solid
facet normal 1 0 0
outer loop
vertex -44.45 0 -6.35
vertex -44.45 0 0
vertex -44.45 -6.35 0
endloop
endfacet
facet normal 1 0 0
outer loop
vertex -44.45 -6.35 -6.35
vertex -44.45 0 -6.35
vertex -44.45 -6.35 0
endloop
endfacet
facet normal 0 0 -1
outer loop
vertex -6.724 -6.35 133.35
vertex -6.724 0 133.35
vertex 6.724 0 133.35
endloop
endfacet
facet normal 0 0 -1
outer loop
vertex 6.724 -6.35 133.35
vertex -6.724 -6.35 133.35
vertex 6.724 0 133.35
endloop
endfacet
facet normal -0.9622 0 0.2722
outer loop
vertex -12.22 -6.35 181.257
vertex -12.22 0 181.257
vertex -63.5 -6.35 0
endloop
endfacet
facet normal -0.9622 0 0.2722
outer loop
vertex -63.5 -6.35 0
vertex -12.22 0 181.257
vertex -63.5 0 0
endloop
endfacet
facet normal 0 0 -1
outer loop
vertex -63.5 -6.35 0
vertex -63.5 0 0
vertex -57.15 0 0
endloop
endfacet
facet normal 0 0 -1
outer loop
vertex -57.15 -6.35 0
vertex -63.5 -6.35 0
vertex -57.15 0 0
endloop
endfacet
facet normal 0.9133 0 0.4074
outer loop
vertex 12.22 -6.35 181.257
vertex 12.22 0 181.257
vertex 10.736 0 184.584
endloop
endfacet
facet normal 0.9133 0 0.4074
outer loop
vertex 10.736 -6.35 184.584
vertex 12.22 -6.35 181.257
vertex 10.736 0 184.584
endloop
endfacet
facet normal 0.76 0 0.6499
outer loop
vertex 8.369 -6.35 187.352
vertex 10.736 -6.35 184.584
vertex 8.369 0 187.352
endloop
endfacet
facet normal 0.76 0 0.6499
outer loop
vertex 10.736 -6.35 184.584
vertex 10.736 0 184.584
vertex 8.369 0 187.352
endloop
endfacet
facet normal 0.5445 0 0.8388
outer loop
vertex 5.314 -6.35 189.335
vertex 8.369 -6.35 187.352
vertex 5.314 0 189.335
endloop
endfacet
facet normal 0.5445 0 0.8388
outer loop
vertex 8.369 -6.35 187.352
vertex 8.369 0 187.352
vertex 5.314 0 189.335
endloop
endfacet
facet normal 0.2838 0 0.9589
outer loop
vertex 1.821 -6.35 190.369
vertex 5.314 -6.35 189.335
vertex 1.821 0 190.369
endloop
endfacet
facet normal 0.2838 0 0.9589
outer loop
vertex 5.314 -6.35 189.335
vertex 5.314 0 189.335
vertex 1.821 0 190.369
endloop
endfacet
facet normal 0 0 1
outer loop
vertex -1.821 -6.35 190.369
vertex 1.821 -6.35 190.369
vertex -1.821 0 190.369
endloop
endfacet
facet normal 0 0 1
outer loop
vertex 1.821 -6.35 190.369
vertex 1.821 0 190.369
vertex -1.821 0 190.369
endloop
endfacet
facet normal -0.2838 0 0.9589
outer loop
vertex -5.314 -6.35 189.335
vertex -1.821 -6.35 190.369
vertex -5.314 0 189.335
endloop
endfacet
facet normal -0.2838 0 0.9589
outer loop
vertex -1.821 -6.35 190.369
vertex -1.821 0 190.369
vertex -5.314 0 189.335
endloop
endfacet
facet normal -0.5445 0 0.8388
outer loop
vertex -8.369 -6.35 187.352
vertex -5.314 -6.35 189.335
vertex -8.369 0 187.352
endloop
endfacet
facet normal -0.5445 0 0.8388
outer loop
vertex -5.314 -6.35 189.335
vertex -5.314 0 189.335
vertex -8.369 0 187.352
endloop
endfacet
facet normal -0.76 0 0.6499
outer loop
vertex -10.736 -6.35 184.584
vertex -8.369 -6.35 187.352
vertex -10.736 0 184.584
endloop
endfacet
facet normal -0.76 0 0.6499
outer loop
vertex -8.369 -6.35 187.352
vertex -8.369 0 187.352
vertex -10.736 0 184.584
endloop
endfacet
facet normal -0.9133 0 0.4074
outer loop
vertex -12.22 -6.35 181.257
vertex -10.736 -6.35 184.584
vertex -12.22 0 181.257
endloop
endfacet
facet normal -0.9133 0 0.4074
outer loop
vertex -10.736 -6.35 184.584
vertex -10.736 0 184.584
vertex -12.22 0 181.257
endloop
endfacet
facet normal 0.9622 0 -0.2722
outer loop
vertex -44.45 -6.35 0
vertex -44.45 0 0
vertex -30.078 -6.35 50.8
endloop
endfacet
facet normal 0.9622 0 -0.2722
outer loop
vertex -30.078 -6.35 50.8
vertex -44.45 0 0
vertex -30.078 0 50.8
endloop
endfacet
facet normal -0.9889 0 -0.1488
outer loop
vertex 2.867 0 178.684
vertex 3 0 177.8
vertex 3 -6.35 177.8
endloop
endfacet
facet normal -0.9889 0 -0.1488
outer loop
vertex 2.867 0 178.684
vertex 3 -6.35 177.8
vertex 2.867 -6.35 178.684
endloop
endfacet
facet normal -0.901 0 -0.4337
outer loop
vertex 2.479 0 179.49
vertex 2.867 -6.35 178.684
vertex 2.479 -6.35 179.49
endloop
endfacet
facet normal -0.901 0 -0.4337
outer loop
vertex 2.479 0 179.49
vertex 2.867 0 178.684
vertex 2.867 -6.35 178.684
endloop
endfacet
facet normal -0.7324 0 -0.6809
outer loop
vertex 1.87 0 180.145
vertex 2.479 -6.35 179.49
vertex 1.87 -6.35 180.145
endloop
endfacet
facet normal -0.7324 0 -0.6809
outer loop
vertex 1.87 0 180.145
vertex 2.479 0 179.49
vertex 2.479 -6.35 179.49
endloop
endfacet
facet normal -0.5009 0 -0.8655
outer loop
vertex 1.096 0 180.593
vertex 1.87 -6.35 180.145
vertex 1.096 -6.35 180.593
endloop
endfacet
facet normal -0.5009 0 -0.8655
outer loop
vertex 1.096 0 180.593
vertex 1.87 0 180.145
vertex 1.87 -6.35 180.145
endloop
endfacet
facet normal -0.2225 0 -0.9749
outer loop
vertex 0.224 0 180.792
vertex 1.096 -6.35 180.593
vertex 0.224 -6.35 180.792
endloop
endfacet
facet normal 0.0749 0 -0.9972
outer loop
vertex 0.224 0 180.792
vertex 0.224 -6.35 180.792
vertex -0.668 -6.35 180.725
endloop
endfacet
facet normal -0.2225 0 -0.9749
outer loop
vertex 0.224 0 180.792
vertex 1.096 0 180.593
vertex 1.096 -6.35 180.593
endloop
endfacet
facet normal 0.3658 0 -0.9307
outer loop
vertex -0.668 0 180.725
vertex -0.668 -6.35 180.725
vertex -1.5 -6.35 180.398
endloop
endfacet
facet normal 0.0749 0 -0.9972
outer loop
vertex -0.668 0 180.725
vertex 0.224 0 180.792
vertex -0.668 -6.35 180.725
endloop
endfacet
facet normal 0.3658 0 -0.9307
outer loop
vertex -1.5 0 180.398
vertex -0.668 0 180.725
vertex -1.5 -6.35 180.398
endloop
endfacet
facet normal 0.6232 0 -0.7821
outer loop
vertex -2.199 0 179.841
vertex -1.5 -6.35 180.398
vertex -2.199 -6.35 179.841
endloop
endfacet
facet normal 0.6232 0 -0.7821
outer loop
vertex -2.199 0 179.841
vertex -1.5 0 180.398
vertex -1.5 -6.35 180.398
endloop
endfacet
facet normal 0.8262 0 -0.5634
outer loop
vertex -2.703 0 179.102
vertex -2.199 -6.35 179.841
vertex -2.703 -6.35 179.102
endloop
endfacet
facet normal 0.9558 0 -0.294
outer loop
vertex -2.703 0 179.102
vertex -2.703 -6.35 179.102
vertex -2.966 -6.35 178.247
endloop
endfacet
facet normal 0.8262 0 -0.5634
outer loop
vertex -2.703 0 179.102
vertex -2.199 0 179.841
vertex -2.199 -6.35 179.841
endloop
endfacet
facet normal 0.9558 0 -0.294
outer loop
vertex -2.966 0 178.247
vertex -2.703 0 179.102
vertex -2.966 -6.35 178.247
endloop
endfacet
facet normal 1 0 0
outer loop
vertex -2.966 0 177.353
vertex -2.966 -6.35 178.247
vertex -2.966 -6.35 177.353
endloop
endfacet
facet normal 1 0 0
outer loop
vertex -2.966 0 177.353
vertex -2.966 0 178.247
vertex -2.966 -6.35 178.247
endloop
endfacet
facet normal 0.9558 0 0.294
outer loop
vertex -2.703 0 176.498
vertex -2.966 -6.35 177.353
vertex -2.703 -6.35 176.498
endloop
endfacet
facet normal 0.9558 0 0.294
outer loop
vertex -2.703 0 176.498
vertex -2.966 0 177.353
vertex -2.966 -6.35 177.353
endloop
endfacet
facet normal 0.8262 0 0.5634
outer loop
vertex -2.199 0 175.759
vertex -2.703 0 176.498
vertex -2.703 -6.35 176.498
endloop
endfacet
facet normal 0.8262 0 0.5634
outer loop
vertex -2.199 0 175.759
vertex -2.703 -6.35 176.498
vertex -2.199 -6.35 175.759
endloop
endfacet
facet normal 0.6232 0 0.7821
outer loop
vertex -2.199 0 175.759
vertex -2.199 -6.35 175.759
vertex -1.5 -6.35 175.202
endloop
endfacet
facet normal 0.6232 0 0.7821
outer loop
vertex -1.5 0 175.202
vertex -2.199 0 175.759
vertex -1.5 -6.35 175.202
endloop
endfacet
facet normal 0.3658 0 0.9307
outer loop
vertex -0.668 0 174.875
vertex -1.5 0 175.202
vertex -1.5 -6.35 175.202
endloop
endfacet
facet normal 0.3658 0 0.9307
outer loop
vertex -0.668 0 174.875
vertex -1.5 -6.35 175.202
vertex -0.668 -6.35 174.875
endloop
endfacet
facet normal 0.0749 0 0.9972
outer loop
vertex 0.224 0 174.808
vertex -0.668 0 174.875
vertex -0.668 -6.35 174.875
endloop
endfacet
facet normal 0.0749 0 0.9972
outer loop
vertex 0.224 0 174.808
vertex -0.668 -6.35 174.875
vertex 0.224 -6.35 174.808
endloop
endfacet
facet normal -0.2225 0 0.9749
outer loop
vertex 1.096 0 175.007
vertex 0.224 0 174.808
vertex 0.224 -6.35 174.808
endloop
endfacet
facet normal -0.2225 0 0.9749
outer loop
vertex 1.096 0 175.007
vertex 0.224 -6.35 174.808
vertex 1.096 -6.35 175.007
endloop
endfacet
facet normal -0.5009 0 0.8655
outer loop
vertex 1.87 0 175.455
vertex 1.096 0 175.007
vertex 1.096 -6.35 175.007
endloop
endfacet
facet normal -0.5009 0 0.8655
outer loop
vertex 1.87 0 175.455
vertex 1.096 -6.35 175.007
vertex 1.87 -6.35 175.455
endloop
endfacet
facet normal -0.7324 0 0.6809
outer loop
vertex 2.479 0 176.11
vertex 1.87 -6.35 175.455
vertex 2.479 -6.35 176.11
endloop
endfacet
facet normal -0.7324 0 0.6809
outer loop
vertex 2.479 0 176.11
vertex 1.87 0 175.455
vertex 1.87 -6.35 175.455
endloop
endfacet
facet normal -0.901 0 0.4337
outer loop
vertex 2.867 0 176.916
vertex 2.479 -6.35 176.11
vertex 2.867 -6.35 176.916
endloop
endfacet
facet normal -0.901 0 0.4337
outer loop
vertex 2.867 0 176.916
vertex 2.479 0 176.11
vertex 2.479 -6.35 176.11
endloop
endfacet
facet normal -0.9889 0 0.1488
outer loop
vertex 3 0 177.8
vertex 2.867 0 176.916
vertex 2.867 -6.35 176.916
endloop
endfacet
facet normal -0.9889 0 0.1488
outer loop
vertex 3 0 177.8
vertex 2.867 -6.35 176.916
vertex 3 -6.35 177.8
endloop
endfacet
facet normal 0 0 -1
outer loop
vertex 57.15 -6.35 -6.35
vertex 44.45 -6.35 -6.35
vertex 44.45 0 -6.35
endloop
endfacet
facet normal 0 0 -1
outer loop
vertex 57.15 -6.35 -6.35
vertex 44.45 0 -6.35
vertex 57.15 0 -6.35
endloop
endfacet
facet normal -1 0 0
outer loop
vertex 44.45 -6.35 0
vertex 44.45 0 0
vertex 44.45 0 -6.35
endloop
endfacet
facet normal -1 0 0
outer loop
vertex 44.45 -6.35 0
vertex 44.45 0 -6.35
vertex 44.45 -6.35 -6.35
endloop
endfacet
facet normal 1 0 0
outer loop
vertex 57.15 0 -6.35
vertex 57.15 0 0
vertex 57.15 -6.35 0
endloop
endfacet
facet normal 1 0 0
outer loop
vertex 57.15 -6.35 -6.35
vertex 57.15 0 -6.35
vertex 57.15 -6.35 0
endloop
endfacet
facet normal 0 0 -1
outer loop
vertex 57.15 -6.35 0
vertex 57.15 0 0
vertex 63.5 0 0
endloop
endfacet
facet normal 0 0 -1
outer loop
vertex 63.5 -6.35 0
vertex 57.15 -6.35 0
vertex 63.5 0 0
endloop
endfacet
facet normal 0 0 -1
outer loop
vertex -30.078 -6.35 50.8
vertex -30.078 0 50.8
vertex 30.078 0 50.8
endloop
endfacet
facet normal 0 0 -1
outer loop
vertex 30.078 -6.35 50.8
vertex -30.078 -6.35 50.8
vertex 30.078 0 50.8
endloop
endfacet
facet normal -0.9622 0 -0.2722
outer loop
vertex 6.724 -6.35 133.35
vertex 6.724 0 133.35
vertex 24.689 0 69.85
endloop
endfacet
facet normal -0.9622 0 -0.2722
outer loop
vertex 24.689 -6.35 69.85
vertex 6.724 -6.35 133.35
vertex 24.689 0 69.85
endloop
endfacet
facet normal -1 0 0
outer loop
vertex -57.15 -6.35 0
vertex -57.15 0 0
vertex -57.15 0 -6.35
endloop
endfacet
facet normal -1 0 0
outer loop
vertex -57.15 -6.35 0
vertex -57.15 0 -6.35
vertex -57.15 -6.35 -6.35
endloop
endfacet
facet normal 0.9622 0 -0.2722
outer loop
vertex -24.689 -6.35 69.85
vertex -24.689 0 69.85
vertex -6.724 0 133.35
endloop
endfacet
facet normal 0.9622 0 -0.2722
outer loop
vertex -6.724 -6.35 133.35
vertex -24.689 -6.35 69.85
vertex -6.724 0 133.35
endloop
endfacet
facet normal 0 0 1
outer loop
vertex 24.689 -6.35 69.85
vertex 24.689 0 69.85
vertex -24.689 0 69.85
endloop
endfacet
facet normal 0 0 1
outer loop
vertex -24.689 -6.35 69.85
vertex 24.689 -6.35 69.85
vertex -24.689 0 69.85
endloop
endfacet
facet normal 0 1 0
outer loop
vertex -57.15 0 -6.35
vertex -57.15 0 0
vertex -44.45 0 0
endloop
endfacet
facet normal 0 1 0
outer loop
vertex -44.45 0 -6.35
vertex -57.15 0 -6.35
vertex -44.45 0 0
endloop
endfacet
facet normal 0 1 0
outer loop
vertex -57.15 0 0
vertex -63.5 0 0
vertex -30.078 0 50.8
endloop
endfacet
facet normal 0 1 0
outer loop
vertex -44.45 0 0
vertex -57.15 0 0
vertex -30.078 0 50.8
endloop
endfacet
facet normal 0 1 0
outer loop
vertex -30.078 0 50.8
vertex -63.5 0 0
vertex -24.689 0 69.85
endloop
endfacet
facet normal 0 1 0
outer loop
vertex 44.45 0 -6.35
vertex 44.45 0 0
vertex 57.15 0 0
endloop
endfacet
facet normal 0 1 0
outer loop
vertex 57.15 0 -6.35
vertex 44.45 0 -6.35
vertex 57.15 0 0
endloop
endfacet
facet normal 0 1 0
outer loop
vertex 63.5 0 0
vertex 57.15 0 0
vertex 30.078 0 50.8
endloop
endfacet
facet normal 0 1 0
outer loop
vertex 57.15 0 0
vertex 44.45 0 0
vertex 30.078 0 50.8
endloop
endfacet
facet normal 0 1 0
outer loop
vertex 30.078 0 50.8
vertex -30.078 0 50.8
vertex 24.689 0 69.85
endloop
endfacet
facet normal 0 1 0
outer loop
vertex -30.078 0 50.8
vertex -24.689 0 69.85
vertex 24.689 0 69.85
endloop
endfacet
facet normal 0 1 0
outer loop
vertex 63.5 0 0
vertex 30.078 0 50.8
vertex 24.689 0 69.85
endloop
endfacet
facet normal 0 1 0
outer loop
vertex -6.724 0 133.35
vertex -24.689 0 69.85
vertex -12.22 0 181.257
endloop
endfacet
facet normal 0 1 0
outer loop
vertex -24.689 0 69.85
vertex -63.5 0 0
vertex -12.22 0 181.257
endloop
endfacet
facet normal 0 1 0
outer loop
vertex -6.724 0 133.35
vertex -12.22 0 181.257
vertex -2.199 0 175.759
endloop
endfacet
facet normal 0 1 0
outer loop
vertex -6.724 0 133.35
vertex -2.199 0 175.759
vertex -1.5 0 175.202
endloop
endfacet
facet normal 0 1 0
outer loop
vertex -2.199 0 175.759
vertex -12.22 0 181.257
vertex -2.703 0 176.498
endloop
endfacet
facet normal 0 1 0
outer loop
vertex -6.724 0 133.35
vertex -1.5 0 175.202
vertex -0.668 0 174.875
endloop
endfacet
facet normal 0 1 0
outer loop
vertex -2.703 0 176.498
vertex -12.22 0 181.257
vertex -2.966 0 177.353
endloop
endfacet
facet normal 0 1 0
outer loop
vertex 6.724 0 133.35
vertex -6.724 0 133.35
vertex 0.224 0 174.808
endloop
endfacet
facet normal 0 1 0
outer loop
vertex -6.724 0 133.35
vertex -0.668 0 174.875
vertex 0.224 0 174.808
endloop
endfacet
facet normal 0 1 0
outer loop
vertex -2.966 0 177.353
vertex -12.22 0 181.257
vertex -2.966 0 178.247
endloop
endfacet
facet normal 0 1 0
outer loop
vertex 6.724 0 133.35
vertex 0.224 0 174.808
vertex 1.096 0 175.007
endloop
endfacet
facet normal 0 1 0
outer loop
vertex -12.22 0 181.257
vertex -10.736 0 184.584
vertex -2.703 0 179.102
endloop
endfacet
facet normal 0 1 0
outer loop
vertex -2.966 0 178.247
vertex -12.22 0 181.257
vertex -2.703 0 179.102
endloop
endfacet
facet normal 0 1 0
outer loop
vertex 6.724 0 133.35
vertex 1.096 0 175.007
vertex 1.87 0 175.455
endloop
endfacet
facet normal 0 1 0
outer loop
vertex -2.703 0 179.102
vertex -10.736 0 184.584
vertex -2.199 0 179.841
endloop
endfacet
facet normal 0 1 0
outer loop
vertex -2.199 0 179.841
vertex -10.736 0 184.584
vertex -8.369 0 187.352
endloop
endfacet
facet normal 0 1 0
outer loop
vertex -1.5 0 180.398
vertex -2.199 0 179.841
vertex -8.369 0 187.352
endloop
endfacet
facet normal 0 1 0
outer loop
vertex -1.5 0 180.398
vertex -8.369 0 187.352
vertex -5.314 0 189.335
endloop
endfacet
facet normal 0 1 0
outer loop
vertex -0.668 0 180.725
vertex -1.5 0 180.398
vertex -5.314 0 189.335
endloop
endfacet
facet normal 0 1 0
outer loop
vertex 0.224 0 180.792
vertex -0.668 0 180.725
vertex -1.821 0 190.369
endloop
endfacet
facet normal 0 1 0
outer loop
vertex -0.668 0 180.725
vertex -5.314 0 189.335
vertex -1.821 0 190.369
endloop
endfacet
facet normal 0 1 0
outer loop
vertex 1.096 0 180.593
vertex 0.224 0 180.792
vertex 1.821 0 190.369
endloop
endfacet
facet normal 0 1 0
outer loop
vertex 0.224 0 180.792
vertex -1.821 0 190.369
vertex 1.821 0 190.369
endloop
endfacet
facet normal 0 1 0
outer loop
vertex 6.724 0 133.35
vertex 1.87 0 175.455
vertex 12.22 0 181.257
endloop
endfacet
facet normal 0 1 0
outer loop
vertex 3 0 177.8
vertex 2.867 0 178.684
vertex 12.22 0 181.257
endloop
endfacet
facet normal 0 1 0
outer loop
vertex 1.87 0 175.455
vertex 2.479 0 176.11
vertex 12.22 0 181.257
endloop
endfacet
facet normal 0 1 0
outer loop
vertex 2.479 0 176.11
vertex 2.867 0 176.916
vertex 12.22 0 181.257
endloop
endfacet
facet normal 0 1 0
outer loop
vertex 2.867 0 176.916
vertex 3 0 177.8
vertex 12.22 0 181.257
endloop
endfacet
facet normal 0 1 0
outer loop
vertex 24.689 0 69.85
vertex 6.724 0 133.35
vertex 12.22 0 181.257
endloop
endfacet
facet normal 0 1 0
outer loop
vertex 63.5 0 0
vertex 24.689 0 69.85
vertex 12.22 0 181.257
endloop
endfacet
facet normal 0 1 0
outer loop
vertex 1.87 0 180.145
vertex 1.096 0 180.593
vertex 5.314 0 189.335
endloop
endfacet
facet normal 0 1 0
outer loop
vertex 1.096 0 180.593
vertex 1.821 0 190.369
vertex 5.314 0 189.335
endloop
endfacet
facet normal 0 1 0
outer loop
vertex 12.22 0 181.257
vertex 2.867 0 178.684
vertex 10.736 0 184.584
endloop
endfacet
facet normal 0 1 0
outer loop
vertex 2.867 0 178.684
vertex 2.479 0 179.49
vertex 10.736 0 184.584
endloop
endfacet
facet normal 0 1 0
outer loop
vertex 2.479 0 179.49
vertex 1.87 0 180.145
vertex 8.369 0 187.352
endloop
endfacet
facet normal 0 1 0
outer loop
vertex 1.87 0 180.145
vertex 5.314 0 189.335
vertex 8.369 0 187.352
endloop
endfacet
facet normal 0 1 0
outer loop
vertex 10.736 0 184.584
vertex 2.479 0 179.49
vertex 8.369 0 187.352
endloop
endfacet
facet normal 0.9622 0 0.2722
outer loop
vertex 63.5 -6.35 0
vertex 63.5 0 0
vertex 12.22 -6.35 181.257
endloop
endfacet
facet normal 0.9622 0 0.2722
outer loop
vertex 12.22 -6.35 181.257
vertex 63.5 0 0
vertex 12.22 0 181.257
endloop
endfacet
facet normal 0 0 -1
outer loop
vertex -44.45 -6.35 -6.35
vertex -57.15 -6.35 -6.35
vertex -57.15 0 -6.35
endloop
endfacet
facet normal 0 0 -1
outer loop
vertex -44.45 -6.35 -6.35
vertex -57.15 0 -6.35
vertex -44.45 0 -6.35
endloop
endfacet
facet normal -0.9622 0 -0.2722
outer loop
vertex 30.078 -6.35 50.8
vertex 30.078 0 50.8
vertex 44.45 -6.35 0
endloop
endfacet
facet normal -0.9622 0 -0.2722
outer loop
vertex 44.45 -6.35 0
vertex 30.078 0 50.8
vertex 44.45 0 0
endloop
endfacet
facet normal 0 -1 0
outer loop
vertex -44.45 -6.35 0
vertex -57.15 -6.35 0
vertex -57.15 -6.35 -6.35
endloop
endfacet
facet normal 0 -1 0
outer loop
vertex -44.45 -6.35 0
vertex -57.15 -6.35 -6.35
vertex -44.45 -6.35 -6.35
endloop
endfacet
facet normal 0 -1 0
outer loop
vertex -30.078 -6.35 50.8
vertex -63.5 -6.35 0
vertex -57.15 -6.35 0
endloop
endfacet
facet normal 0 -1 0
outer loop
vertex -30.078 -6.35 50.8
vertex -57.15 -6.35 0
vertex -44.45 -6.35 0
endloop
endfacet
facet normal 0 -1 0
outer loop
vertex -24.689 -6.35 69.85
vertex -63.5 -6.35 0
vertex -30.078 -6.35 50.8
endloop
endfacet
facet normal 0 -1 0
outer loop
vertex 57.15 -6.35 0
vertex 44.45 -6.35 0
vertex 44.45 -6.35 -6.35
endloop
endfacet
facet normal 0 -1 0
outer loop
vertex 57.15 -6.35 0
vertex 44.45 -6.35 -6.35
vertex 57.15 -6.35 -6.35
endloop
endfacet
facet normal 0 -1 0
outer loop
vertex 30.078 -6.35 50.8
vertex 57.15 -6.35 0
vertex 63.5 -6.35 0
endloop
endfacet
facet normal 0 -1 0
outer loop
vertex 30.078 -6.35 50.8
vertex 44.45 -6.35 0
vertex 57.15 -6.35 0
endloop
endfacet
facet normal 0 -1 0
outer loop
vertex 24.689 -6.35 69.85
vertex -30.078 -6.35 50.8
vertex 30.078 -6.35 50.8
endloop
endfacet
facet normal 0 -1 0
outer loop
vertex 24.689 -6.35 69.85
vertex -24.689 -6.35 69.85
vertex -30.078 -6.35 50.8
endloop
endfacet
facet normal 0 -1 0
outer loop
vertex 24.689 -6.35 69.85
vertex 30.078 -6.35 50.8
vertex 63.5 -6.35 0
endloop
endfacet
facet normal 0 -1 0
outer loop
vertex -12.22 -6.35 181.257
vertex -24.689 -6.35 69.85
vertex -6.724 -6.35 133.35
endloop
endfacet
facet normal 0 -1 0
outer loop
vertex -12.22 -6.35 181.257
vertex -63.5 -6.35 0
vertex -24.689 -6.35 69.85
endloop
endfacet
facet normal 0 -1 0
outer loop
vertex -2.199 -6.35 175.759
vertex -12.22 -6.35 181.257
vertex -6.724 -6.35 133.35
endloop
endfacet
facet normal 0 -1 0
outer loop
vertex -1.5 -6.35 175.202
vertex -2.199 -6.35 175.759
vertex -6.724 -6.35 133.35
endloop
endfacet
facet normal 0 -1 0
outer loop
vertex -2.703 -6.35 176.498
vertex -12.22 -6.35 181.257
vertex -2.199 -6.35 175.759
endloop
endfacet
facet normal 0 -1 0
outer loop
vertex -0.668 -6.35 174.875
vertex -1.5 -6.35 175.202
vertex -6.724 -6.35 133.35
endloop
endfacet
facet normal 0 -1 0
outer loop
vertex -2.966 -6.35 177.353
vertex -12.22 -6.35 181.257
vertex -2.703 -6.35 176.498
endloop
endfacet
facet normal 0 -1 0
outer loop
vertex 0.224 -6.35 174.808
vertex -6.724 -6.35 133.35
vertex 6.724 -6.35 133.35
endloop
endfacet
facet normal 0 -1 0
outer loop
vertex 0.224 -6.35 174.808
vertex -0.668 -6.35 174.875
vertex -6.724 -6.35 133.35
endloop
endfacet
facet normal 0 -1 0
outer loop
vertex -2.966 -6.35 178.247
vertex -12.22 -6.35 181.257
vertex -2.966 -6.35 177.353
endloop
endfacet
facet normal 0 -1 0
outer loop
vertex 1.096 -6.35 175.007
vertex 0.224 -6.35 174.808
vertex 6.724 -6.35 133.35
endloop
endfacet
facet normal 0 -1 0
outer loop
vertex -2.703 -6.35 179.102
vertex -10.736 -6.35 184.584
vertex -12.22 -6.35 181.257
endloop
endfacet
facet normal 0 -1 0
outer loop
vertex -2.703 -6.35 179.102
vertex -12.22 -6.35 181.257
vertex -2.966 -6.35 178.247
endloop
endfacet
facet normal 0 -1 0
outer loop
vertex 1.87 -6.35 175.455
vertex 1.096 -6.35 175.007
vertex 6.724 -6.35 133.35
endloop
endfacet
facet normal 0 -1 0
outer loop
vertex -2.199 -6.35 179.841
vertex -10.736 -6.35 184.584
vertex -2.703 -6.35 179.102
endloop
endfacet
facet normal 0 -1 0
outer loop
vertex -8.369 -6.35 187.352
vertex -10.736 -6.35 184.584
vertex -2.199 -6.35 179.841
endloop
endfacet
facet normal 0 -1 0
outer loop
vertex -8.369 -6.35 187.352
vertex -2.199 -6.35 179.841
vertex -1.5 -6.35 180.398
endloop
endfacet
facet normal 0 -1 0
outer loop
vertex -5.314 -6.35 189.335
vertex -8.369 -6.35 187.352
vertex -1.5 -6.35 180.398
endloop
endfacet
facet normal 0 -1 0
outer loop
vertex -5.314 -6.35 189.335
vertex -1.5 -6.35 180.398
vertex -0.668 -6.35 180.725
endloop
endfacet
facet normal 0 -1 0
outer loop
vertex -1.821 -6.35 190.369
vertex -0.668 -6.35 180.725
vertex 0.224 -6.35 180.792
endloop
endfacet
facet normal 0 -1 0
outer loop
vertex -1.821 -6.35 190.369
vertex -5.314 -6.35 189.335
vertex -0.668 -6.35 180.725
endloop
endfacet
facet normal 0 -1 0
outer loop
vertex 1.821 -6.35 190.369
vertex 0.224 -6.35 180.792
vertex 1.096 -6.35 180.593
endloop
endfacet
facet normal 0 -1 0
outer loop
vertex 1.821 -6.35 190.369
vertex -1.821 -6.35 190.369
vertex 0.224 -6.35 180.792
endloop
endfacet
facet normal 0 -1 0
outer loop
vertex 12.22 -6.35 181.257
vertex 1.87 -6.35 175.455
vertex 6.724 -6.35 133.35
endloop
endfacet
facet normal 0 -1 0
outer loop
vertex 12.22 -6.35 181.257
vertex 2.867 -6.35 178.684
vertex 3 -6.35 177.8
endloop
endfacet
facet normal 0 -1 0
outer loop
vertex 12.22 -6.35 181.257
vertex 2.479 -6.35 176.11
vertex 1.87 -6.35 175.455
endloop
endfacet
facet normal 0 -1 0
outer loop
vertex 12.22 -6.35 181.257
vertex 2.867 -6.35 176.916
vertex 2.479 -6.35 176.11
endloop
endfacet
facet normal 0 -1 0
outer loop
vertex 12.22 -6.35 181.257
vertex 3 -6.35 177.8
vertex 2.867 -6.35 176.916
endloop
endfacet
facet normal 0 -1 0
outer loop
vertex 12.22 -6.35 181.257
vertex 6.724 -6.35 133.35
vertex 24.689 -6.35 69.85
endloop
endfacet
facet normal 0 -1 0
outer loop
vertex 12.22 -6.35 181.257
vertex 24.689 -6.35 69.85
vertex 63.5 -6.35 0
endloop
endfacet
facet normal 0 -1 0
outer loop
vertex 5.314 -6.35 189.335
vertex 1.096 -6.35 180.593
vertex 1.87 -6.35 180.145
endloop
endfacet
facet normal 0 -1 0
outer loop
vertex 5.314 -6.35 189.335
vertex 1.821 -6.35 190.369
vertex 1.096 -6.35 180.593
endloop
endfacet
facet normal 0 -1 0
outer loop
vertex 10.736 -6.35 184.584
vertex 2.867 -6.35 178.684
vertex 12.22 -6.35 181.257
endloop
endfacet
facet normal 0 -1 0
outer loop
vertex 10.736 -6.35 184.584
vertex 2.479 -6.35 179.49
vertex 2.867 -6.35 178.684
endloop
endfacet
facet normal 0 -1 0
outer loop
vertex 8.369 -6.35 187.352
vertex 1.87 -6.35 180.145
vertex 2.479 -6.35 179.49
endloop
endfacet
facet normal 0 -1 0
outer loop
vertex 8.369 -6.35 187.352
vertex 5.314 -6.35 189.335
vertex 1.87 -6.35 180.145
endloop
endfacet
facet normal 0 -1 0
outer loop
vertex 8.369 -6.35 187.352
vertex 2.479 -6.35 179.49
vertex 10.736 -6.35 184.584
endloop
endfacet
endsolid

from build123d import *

# Parameters (mm, degrees)
F0_R     = 3
F1_DEPTH = 6.35
F2_W     = 12.7
F2_H     = 6.35
F3_DEPTH = 6.35


with BuildPart() as f1:
    # F0 (on Front) → F1 (new body)
    with BuildSketch(Plane.XZ):
        with BuildLine():
            Line((63.5, 0), (12.220363, 181.257272))
            ThreePointArc((12.220363, 181.257272), (0, 190.5), (-12.220363, 181.257272))
            Line((-12.220363, 181.257272), (-63.5, 0))
            Line((-63.5, 0), (-44.45, 0))
            Line((-44.45, 0), (-30.078132, 50.8))
            Line((-30.078132, 50.8), (30.078132, 50.8))
            Line((30.078132, 50.8), (44.45, 0))
            Line((44.45, 0), (63.5, 0))
        make_face()
        Polygon((24.688682, 69.85), (-24.688682, 69.85), (-6.723847, 133.35), (6.723847, 133.35), align=None, mode=Mode.SUBTRACT)
        with Locations((0, 177.8)):
            Circle(F0_R, mode=Mode.SUBTRACT)
    extrude(amount=F1_DEPTH)

    # F2 (on face) → F3 (join)
    with BuildSketch(Plane(origin=(0, 0, 0), x_dir=(1, 0, 0), z_dir=(0, 0, -1))):
        with Locations((-50.8, 3.175)):
            Rectangle(F2_W, F2_H)
        with Locations((50.8, 3.175)):
            Rectangle(F2_W, F2_H)
    extrude(amount=F3_DEPTH)


solid = f1.part
